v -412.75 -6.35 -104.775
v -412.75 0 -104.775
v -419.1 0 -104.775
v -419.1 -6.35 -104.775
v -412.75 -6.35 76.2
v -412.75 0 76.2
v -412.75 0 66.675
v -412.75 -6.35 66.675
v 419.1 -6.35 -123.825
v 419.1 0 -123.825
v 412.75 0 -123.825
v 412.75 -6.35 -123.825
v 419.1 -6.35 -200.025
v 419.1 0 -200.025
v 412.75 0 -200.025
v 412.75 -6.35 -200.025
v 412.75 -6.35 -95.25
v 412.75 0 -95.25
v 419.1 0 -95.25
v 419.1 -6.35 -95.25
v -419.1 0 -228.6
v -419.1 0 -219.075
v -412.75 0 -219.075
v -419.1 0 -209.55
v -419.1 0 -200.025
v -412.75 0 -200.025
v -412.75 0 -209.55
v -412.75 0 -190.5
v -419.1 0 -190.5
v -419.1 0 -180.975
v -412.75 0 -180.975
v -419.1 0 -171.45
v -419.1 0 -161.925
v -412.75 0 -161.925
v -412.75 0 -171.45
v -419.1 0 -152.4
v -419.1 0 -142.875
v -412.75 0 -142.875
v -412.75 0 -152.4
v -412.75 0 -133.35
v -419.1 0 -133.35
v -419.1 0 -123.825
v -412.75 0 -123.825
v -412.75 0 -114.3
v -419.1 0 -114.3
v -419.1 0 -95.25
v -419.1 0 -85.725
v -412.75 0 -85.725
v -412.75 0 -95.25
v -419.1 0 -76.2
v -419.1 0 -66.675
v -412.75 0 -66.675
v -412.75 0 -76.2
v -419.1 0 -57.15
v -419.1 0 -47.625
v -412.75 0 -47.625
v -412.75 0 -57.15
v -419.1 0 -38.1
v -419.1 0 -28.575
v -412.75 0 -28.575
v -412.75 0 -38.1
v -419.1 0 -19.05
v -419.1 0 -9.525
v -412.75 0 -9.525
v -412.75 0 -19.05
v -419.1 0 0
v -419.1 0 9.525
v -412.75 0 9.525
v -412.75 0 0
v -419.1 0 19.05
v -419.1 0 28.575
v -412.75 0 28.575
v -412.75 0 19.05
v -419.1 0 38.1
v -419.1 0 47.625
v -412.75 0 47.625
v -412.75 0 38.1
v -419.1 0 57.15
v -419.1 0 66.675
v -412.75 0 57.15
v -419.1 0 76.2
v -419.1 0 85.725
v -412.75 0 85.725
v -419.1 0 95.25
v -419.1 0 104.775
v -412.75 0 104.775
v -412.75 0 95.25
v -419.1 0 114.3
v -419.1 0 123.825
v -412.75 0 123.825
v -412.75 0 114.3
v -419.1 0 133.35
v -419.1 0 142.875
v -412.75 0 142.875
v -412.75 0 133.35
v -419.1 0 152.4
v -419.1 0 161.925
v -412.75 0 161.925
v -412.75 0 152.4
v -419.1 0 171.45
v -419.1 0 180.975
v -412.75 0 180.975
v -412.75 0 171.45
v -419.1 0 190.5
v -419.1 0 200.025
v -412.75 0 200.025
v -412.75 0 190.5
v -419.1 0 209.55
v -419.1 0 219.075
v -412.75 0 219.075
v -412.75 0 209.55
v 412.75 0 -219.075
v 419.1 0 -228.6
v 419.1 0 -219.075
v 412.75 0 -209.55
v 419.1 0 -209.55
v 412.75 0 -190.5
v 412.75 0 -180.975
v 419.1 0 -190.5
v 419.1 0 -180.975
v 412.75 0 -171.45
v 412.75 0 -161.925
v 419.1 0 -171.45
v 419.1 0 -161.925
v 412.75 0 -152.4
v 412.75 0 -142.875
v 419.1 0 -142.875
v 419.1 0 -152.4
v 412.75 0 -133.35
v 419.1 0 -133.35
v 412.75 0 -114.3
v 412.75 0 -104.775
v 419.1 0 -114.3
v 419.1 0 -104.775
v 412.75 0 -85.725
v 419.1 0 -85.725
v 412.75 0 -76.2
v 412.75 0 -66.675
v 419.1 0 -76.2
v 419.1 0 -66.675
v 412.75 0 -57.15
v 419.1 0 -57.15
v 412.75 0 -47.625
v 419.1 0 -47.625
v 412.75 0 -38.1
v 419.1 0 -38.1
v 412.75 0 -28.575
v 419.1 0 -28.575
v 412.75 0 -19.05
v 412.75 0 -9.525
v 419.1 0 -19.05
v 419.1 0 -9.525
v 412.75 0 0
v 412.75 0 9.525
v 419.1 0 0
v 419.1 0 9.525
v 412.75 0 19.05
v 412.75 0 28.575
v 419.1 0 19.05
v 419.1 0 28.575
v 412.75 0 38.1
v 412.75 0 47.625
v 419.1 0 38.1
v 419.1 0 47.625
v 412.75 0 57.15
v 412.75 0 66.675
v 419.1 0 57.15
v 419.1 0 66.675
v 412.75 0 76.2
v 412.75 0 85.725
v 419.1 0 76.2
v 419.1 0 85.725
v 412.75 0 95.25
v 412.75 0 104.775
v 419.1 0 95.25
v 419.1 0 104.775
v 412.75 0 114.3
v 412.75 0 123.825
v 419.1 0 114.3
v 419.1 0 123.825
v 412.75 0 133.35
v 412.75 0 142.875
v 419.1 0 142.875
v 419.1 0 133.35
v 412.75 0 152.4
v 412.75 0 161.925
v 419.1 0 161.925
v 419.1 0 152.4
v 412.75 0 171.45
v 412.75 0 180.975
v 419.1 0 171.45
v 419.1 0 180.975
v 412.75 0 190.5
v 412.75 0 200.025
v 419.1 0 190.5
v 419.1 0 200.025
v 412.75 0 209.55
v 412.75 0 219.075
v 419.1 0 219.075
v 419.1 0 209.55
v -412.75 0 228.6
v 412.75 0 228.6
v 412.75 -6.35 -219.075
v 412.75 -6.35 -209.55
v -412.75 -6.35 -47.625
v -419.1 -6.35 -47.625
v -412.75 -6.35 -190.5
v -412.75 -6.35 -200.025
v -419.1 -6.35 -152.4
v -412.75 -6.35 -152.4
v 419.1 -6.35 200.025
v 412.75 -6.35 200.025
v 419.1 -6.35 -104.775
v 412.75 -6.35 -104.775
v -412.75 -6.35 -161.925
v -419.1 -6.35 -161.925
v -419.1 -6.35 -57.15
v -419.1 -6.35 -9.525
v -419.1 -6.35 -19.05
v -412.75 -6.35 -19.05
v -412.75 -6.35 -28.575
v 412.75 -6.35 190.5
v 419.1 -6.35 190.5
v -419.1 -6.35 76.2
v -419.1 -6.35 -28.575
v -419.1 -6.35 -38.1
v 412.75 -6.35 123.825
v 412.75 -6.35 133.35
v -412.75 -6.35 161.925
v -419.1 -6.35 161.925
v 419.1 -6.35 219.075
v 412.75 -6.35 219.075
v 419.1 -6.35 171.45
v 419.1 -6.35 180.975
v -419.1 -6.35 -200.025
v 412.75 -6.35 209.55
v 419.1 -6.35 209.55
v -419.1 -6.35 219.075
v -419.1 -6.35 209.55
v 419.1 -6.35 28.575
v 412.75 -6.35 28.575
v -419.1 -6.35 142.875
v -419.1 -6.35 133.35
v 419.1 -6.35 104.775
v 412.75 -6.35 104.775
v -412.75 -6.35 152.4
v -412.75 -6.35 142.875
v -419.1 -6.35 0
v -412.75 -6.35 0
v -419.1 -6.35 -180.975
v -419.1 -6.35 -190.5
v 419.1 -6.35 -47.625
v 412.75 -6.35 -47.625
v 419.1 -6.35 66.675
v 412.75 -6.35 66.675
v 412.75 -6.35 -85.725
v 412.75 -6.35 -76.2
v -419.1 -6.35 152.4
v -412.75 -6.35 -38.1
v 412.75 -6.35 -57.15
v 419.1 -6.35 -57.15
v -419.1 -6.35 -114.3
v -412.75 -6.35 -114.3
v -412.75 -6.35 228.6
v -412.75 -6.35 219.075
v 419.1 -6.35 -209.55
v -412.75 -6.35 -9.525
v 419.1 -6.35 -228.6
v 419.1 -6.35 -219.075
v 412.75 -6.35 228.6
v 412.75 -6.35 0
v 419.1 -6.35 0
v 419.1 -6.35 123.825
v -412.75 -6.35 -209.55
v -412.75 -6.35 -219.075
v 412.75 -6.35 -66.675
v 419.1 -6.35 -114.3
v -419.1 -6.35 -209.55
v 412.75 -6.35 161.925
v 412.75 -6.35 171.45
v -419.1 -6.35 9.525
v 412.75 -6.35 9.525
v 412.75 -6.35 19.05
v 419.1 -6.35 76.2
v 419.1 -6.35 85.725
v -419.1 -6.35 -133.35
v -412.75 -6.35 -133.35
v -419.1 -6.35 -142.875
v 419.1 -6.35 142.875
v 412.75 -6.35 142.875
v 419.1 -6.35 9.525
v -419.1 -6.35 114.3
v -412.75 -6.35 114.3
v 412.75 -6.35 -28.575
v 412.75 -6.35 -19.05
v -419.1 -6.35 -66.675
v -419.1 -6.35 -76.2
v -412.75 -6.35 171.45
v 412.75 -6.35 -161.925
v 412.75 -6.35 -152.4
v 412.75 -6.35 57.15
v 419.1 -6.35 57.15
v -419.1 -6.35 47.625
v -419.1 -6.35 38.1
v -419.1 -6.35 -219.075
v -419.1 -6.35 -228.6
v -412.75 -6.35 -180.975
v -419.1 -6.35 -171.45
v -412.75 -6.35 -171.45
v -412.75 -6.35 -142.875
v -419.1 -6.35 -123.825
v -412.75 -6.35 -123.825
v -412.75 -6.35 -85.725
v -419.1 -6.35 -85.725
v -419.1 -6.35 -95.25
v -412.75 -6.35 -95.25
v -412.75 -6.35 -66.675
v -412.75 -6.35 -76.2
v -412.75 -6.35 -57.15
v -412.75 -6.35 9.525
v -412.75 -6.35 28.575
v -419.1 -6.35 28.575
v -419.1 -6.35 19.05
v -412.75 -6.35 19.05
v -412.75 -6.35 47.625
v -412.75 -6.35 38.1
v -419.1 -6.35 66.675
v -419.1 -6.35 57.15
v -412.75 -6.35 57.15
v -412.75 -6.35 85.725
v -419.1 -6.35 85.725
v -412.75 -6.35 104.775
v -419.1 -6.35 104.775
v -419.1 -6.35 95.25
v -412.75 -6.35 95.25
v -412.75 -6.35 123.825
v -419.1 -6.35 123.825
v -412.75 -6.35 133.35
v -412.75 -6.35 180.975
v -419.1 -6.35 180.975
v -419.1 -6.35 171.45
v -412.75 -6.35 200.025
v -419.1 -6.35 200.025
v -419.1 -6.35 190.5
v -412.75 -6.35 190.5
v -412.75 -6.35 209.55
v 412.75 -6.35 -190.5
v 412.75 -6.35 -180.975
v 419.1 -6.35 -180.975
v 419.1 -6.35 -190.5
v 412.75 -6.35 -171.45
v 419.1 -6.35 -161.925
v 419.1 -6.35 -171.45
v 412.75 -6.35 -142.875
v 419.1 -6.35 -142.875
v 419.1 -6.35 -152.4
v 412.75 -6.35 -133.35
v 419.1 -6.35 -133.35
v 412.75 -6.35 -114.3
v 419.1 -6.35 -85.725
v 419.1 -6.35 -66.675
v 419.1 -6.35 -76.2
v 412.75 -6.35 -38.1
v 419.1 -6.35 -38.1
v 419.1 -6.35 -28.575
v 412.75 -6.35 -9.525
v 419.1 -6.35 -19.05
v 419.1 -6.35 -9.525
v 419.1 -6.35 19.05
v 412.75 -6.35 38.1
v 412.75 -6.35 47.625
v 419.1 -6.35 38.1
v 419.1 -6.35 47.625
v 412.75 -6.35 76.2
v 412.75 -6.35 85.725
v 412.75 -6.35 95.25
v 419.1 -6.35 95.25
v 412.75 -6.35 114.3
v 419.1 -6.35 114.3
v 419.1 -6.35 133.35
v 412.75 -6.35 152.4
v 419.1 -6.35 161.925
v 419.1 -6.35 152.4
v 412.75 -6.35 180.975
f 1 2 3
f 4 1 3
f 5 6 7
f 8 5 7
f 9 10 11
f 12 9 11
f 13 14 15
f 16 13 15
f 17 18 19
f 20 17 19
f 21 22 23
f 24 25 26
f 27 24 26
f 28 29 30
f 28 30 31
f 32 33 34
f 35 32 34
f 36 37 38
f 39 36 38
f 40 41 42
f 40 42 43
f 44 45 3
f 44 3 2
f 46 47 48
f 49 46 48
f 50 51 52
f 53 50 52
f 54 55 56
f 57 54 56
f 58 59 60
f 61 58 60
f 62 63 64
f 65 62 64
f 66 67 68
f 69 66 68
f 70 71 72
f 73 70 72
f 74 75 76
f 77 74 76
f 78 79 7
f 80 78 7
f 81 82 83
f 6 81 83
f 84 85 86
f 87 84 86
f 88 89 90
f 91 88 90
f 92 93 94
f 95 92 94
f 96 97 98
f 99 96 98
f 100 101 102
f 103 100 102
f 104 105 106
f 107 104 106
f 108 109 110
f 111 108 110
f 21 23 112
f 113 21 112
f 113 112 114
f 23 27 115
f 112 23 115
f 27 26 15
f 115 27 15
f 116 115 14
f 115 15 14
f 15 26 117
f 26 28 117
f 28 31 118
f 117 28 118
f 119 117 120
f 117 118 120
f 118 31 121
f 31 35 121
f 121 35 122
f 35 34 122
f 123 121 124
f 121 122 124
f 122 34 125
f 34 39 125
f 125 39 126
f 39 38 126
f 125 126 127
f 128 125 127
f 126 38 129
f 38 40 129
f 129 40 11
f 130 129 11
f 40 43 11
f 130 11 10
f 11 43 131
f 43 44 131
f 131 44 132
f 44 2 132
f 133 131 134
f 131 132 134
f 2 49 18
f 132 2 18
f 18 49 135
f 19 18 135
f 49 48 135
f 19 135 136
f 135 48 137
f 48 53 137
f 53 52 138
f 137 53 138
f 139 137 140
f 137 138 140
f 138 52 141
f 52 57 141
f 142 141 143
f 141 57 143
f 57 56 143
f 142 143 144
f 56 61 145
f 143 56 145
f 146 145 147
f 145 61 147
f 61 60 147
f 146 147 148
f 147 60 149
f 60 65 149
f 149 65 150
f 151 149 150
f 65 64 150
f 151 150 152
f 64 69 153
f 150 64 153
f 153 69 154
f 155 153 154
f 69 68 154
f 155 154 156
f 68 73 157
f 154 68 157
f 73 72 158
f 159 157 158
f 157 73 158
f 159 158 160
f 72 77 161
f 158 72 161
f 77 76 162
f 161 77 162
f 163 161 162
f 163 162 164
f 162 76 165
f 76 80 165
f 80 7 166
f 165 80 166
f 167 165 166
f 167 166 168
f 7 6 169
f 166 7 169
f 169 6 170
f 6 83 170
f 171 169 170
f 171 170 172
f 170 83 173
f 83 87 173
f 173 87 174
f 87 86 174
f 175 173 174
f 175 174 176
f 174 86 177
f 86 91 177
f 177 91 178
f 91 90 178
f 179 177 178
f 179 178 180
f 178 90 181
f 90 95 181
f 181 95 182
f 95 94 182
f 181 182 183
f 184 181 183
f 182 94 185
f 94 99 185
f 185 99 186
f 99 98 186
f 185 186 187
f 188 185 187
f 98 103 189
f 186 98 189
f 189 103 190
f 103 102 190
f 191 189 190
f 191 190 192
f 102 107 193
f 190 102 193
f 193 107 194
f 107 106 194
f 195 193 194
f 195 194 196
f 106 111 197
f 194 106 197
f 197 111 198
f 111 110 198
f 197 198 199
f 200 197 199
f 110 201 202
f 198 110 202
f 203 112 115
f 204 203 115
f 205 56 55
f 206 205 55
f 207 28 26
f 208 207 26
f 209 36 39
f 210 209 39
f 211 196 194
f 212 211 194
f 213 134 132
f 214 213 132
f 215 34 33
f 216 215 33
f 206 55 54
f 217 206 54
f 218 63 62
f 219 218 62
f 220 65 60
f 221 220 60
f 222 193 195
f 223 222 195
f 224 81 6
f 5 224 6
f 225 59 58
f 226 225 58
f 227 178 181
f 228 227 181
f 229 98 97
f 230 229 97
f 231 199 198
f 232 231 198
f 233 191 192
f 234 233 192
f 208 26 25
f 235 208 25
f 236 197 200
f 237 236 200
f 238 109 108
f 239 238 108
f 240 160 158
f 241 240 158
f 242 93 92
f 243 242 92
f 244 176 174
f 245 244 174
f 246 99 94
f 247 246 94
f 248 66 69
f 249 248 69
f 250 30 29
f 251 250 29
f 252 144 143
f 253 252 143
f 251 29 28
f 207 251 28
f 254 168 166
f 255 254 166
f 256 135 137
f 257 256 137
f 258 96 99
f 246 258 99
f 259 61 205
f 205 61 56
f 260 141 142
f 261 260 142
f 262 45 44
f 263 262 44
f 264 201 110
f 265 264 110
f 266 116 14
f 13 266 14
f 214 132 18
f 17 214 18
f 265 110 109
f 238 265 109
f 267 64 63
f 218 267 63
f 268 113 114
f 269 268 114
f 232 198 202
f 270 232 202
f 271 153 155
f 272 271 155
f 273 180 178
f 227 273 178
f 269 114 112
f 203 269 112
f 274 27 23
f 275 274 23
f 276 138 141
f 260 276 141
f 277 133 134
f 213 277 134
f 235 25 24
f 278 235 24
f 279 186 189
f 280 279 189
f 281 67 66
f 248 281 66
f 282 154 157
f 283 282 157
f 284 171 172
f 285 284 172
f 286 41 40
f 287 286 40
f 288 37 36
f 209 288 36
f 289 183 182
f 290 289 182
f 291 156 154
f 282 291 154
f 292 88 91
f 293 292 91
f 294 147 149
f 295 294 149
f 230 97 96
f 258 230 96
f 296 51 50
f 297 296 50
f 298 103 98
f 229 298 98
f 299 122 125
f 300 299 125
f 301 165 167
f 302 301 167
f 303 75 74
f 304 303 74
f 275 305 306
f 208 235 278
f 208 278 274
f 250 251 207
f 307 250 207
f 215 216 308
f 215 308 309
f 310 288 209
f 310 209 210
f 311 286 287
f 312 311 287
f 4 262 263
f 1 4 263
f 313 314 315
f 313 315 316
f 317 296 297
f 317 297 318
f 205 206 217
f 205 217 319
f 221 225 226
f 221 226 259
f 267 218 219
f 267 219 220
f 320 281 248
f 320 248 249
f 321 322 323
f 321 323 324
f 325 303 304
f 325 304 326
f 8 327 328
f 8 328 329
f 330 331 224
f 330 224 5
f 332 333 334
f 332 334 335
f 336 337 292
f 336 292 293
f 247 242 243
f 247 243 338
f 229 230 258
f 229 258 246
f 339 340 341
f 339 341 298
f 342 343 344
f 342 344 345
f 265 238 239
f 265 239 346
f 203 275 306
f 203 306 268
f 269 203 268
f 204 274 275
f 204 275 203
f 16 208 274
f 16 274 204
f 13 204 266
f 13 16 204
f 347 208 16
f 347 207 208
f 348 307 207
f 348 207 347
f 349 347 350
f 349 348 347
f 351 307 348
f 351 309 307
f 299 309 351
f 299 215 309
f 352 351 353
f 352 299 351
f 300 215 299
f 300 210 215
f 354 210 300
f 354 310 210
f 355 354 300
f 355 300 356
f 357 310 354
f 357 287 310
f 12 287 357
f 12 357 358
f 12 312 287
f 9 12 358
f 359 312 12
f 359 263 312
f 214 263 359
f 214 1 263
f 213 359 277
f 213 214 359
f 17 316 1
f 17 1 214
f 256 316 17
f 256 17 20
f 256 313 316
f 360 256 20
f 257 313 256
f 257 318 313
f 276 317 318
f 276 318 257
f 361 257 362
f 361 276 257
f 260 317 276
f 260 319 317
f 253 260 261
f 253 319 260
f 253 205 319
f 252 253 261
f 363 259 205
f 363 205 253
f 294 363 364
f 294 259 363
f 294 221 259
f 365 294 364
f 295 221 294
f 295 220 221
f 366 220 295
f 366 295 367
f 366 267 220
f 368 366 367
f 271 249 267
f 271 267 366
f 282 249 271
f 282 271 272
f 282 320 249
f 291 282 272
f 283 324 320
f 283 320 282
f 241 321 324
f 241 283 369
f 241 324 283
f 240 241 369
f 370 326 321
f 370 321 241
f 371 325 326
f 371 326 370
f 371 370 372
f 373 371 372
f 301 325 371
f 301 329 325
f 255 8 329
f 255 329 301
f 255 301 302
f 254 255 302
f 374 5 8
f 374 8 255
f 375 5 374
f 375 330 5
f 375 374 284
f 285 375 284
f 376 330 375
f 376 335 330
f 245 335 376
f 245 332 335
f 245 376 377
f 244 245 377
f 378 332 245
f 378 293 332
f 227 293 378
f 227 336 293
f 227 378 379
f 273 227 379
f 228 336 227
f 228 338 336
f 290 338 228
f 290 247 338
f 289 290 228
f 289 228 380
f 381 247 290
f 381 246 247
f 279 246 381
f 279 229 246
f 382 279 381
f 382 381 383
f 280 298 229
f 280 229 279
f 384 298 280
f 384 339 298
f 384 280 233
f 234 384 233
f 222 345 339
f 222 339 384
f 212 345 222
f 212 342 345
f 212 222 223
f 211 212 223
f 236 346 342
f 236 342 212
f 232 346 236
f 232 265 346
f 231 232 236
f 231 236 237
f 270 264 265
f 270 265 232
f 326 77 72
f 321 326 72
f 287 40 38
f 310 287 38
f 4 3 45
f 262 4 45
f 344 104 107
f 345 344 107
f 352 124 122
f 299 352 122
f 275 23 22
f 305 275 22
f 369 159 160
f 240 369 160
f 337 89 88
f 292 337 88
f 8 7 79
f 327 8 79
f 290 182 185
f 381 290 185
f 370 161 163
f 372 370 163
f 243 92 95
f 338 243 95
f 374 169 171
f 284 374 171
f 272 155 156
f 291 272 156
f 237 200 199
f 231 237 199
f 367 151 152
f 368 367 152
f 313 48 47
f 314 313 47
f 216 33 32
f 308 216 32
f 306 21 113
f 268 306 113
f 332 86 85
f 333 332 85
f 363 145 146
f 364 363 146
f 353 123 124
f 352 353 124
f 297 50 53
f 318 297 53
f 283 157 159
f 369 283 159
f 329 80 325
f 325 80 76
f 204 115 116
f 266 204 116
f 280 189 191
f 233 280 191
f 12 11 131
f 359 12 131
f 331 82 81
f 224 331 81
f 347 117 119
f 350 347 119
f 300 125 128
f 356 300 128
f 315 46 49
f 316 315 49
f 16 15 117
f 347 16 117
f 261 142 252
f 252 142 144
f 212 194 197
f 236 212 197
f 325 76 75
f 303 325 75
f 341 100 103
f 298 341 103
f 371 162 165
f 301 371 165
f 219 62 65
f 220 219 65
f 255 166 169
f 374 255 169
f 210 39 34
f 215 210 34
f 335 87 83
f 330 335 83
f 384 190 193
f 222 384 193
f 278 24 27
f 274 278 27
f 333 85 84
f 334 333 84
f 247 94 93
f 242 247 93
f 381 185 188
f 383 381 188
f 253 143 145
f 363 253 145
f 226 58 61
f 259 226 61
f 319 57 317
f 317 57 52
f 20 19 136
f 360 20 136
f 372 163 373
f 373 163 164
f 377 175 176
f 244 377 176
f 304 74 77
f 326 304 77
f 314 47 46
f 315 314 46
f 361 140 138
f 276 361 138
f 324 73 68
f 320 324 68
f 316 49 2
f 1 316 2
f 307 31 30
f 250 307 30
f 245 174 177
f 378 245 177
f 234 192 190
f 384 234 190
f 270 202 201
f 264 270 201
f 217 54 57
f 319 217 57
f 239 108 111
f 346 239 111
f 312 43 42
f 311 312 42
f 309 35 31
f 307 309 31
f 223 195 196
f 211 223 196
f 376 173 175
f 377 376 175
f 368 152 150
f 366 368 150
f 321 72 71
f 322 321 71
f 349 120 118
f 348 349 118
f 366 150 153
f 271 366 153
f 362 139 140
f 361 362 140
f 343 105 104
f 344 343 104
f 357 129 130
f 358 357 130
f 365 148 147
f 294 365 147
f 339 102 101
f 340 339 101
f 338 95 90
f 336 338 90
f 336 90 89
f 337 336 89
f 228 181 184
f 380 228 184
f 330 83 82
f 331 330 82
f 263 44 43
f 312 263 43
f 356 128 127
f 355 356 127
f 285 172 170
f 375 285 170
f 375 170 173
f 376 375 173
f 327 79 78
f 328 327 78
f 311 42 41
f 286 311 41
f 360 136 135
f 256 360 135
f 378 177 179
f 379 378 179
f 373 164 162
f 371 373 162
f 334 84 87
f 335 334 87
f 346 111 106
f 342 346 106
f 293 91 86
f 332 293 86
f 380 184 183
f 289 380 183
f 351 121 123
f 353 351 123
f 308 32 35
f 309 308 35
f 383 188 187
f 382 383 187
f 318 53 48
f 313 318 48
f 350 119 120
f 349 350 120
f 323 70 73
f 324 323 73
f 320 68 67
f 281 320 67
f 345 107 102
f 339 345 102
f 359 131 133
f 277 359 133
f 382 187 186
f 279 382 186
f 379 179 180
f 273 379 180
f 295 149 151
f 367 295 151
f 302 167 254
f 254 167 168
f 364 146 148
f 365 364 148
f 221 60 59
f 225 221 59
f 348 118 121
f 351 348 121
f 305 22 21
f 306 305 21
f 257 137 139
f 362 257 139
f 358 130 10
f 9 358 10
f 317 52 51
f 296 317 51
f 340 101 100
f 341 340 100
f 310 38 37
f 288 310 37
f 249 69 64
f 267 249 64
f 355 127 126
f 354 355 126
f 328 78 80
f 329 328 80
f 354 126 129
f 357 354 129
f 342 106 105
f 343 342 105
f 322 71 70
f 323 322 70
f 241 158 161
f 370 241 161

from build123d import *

# Parameters (mm, degrees)
F1_DEPTH = 6.35


with BuildPart() as f1:
    # F0 (on Front) → F1 (new body)
    with BuildSketch(Plane.XZ):
        Polygon((412.75, 219.075), (412.75, 228.6), (0, 228.6), (0, -228.6), (419.1, -228.6), (419.1, -219.075), (412.75, -219.075), (412.75, -209.55), (419.1, -209.55), (419.1, -200.025), (412.75, -200.025), (412.75, -190.5), (419.1, -190.5), (419.1, -180.975), (412.75, -180.975), (412.75, -171.45), (419.1, -171.45), (419.1, -161.925), (412.75, -161.925), (412.75, -152.4), (419.1, -152.4), (419.1, -142.875), (412.75, -142.875), (412.75, -133.35), (419.1, -133.35), (419.1, -123.825), (412.75, -123.825), (412.75, -114.3), (419.1, -114.3), (419.1, -104.775), (412.75, -104.775), (412.75, -95.25), (419.1, -95.25), (419.1, -85.725), (412.75, -85.725), (412.75, -76.2), (419.1, -76.2), (419.1, -66.675), (412.75, -66.675), (412.75, -57.15), (419.1, -57.15), (419.1, -47.625), (412.75, -47.625), (412.75, -38.1), (419.1, -38.1), (419.1, -28.575), (412.75, -28.575), (412.75, -19.05), (419.1, -19.05), (419.1, -9.525), (412.75, -9.525), (412.75, 0), (419.1, 0), (419.1, 9.525), (412.75, 9.525), (412.75, 19.05), (419.1, 19.05), (419.1, 28.575), (412.75, 28.575), (412.75, 38.1), (419.1, 38.1), (419.1, 47.625), (412.75, 47.625), (412.75, 57.15), (419.1, 57.15), (419.1, 66.675), (412.75, 66.675), (412.75, 76.2), (419.1, 76.2), (419.1, 85.725), (412.75, 85.725), (412.75, 95.25), (419.1, 95.25), (419.1, 104.775), (412.75, 104.775), (412.75, 114.3), (419.1, 114.3), (419.1, 123.825), (412.75, 123.825), (412.75, 133.35), (419.1, 133.35), (419.1, 142.875), (412.75, 142.875), (412.75, 152.4), (419.1, 152.4), (419.1, 161.925), (412.75, 161.925), (412.75, 171.45), (419.1, 171.45), (419.1, 180.975), (412.75, 180.975), (412.75, 190.5), (419.1, 190.5), (419.1, 200.025), (412.75, 200.025), (412.75, 209.55), (419.1, 209.55), (419.1, 219.075), align=None)
        Polygon((0, -228.6), (0, 228.6), (-412.75, 228.6), (-412.75, 219.075), (-419.1, 219.075), (-419.1, 209.55), (-412.75, 209.55), (-412.75, 200.025), (-419.1, 200.025), (-419.1, 190.5), (-412.75, 190.5), (-412.75, 180.975), (-419.1, 180.975), (-419.1, 171.45), (-412.75, 171.45), (-412.75, 161.925), (-419.1, 161.925), (-419.1, 152.4), (-412.75, 152.4), (-412.75, 142.875), (-419.1, 142.875), (-419.1, 133.35), (-412.75, 133.35), (-412.75, 123.825), (-419.1, 123.825), (-419.1, 114.3), (-412.75, 114.3), (-412.75, 104.775), (-419.1, 104.775), (-419.1, 95.25), (-412.75, 95.25), (-412.75, 85.725), (-419.1, 85.725), (-419.1, 76.2), (-412.75, 76.2), (-412.75, 66.675), (-419.1, 66.675), (-419.1, 57.15), (-412.75, 57.15), (-412.75, 47.625), (-419.1, 47.625), (-419.1, 38.1), (-412.75, 38.1), (-412.75, 28.575), (-419.1, 28.575), (-419.1, 19.05), (-412.75, 19.05), (-412.75, 9.525), (-419.1, 9.525), (-419.1, 0), (-412.75, 0), (-412.75, -9.525), (-419.1, -9.525), (-419.1, -19.05), (-412.75, -19.05), (-412.75, -28.575), (-419.1, -28.575), (-419.1, -38.1), (-412.75, -38.1), (-412.75, -47.625), (-419.1, -47.625), (-419.1, -57.15), (-412.75, -57.15), (-412.75, -66.675), (-419.1, -66.675), (-419.1, -76.2), (-412.75, -76.2), (-412.75, -85.725), (-419.1, -85.725), (-419.1, -95.25), (-412.75, -95.25), (-412.75, -104.775), (-419.1, -104.775), (-419.1, -114.3), (-412.75, -114.3), (-412.75, -123.825), (-419.1, -123.825), (-419.1, -133.35), (-412.75, -133.35), (-412.75, -142.875), (-419.1, -142.875), (-419.1, -152.4), (-412.75, -152.4), (-412.75, -161.925), (-419.1, -161.925), (-419.1, -171.45), (-412.75, -171.45), (-412.75, -180.975), (-419.1, -180.975), (-419.1, -190.5), (-412.75, -190.5), (-412.75, -200.025), (-419.1, -200.025), (-419.1, -209.55), (-412.75, -209.55), (-412.75, -219.075), (-419.1, -219.075), (-419.1, -228.6), align=None)
    extrude(amount=F1_DEPTH)


solid = f1.part
